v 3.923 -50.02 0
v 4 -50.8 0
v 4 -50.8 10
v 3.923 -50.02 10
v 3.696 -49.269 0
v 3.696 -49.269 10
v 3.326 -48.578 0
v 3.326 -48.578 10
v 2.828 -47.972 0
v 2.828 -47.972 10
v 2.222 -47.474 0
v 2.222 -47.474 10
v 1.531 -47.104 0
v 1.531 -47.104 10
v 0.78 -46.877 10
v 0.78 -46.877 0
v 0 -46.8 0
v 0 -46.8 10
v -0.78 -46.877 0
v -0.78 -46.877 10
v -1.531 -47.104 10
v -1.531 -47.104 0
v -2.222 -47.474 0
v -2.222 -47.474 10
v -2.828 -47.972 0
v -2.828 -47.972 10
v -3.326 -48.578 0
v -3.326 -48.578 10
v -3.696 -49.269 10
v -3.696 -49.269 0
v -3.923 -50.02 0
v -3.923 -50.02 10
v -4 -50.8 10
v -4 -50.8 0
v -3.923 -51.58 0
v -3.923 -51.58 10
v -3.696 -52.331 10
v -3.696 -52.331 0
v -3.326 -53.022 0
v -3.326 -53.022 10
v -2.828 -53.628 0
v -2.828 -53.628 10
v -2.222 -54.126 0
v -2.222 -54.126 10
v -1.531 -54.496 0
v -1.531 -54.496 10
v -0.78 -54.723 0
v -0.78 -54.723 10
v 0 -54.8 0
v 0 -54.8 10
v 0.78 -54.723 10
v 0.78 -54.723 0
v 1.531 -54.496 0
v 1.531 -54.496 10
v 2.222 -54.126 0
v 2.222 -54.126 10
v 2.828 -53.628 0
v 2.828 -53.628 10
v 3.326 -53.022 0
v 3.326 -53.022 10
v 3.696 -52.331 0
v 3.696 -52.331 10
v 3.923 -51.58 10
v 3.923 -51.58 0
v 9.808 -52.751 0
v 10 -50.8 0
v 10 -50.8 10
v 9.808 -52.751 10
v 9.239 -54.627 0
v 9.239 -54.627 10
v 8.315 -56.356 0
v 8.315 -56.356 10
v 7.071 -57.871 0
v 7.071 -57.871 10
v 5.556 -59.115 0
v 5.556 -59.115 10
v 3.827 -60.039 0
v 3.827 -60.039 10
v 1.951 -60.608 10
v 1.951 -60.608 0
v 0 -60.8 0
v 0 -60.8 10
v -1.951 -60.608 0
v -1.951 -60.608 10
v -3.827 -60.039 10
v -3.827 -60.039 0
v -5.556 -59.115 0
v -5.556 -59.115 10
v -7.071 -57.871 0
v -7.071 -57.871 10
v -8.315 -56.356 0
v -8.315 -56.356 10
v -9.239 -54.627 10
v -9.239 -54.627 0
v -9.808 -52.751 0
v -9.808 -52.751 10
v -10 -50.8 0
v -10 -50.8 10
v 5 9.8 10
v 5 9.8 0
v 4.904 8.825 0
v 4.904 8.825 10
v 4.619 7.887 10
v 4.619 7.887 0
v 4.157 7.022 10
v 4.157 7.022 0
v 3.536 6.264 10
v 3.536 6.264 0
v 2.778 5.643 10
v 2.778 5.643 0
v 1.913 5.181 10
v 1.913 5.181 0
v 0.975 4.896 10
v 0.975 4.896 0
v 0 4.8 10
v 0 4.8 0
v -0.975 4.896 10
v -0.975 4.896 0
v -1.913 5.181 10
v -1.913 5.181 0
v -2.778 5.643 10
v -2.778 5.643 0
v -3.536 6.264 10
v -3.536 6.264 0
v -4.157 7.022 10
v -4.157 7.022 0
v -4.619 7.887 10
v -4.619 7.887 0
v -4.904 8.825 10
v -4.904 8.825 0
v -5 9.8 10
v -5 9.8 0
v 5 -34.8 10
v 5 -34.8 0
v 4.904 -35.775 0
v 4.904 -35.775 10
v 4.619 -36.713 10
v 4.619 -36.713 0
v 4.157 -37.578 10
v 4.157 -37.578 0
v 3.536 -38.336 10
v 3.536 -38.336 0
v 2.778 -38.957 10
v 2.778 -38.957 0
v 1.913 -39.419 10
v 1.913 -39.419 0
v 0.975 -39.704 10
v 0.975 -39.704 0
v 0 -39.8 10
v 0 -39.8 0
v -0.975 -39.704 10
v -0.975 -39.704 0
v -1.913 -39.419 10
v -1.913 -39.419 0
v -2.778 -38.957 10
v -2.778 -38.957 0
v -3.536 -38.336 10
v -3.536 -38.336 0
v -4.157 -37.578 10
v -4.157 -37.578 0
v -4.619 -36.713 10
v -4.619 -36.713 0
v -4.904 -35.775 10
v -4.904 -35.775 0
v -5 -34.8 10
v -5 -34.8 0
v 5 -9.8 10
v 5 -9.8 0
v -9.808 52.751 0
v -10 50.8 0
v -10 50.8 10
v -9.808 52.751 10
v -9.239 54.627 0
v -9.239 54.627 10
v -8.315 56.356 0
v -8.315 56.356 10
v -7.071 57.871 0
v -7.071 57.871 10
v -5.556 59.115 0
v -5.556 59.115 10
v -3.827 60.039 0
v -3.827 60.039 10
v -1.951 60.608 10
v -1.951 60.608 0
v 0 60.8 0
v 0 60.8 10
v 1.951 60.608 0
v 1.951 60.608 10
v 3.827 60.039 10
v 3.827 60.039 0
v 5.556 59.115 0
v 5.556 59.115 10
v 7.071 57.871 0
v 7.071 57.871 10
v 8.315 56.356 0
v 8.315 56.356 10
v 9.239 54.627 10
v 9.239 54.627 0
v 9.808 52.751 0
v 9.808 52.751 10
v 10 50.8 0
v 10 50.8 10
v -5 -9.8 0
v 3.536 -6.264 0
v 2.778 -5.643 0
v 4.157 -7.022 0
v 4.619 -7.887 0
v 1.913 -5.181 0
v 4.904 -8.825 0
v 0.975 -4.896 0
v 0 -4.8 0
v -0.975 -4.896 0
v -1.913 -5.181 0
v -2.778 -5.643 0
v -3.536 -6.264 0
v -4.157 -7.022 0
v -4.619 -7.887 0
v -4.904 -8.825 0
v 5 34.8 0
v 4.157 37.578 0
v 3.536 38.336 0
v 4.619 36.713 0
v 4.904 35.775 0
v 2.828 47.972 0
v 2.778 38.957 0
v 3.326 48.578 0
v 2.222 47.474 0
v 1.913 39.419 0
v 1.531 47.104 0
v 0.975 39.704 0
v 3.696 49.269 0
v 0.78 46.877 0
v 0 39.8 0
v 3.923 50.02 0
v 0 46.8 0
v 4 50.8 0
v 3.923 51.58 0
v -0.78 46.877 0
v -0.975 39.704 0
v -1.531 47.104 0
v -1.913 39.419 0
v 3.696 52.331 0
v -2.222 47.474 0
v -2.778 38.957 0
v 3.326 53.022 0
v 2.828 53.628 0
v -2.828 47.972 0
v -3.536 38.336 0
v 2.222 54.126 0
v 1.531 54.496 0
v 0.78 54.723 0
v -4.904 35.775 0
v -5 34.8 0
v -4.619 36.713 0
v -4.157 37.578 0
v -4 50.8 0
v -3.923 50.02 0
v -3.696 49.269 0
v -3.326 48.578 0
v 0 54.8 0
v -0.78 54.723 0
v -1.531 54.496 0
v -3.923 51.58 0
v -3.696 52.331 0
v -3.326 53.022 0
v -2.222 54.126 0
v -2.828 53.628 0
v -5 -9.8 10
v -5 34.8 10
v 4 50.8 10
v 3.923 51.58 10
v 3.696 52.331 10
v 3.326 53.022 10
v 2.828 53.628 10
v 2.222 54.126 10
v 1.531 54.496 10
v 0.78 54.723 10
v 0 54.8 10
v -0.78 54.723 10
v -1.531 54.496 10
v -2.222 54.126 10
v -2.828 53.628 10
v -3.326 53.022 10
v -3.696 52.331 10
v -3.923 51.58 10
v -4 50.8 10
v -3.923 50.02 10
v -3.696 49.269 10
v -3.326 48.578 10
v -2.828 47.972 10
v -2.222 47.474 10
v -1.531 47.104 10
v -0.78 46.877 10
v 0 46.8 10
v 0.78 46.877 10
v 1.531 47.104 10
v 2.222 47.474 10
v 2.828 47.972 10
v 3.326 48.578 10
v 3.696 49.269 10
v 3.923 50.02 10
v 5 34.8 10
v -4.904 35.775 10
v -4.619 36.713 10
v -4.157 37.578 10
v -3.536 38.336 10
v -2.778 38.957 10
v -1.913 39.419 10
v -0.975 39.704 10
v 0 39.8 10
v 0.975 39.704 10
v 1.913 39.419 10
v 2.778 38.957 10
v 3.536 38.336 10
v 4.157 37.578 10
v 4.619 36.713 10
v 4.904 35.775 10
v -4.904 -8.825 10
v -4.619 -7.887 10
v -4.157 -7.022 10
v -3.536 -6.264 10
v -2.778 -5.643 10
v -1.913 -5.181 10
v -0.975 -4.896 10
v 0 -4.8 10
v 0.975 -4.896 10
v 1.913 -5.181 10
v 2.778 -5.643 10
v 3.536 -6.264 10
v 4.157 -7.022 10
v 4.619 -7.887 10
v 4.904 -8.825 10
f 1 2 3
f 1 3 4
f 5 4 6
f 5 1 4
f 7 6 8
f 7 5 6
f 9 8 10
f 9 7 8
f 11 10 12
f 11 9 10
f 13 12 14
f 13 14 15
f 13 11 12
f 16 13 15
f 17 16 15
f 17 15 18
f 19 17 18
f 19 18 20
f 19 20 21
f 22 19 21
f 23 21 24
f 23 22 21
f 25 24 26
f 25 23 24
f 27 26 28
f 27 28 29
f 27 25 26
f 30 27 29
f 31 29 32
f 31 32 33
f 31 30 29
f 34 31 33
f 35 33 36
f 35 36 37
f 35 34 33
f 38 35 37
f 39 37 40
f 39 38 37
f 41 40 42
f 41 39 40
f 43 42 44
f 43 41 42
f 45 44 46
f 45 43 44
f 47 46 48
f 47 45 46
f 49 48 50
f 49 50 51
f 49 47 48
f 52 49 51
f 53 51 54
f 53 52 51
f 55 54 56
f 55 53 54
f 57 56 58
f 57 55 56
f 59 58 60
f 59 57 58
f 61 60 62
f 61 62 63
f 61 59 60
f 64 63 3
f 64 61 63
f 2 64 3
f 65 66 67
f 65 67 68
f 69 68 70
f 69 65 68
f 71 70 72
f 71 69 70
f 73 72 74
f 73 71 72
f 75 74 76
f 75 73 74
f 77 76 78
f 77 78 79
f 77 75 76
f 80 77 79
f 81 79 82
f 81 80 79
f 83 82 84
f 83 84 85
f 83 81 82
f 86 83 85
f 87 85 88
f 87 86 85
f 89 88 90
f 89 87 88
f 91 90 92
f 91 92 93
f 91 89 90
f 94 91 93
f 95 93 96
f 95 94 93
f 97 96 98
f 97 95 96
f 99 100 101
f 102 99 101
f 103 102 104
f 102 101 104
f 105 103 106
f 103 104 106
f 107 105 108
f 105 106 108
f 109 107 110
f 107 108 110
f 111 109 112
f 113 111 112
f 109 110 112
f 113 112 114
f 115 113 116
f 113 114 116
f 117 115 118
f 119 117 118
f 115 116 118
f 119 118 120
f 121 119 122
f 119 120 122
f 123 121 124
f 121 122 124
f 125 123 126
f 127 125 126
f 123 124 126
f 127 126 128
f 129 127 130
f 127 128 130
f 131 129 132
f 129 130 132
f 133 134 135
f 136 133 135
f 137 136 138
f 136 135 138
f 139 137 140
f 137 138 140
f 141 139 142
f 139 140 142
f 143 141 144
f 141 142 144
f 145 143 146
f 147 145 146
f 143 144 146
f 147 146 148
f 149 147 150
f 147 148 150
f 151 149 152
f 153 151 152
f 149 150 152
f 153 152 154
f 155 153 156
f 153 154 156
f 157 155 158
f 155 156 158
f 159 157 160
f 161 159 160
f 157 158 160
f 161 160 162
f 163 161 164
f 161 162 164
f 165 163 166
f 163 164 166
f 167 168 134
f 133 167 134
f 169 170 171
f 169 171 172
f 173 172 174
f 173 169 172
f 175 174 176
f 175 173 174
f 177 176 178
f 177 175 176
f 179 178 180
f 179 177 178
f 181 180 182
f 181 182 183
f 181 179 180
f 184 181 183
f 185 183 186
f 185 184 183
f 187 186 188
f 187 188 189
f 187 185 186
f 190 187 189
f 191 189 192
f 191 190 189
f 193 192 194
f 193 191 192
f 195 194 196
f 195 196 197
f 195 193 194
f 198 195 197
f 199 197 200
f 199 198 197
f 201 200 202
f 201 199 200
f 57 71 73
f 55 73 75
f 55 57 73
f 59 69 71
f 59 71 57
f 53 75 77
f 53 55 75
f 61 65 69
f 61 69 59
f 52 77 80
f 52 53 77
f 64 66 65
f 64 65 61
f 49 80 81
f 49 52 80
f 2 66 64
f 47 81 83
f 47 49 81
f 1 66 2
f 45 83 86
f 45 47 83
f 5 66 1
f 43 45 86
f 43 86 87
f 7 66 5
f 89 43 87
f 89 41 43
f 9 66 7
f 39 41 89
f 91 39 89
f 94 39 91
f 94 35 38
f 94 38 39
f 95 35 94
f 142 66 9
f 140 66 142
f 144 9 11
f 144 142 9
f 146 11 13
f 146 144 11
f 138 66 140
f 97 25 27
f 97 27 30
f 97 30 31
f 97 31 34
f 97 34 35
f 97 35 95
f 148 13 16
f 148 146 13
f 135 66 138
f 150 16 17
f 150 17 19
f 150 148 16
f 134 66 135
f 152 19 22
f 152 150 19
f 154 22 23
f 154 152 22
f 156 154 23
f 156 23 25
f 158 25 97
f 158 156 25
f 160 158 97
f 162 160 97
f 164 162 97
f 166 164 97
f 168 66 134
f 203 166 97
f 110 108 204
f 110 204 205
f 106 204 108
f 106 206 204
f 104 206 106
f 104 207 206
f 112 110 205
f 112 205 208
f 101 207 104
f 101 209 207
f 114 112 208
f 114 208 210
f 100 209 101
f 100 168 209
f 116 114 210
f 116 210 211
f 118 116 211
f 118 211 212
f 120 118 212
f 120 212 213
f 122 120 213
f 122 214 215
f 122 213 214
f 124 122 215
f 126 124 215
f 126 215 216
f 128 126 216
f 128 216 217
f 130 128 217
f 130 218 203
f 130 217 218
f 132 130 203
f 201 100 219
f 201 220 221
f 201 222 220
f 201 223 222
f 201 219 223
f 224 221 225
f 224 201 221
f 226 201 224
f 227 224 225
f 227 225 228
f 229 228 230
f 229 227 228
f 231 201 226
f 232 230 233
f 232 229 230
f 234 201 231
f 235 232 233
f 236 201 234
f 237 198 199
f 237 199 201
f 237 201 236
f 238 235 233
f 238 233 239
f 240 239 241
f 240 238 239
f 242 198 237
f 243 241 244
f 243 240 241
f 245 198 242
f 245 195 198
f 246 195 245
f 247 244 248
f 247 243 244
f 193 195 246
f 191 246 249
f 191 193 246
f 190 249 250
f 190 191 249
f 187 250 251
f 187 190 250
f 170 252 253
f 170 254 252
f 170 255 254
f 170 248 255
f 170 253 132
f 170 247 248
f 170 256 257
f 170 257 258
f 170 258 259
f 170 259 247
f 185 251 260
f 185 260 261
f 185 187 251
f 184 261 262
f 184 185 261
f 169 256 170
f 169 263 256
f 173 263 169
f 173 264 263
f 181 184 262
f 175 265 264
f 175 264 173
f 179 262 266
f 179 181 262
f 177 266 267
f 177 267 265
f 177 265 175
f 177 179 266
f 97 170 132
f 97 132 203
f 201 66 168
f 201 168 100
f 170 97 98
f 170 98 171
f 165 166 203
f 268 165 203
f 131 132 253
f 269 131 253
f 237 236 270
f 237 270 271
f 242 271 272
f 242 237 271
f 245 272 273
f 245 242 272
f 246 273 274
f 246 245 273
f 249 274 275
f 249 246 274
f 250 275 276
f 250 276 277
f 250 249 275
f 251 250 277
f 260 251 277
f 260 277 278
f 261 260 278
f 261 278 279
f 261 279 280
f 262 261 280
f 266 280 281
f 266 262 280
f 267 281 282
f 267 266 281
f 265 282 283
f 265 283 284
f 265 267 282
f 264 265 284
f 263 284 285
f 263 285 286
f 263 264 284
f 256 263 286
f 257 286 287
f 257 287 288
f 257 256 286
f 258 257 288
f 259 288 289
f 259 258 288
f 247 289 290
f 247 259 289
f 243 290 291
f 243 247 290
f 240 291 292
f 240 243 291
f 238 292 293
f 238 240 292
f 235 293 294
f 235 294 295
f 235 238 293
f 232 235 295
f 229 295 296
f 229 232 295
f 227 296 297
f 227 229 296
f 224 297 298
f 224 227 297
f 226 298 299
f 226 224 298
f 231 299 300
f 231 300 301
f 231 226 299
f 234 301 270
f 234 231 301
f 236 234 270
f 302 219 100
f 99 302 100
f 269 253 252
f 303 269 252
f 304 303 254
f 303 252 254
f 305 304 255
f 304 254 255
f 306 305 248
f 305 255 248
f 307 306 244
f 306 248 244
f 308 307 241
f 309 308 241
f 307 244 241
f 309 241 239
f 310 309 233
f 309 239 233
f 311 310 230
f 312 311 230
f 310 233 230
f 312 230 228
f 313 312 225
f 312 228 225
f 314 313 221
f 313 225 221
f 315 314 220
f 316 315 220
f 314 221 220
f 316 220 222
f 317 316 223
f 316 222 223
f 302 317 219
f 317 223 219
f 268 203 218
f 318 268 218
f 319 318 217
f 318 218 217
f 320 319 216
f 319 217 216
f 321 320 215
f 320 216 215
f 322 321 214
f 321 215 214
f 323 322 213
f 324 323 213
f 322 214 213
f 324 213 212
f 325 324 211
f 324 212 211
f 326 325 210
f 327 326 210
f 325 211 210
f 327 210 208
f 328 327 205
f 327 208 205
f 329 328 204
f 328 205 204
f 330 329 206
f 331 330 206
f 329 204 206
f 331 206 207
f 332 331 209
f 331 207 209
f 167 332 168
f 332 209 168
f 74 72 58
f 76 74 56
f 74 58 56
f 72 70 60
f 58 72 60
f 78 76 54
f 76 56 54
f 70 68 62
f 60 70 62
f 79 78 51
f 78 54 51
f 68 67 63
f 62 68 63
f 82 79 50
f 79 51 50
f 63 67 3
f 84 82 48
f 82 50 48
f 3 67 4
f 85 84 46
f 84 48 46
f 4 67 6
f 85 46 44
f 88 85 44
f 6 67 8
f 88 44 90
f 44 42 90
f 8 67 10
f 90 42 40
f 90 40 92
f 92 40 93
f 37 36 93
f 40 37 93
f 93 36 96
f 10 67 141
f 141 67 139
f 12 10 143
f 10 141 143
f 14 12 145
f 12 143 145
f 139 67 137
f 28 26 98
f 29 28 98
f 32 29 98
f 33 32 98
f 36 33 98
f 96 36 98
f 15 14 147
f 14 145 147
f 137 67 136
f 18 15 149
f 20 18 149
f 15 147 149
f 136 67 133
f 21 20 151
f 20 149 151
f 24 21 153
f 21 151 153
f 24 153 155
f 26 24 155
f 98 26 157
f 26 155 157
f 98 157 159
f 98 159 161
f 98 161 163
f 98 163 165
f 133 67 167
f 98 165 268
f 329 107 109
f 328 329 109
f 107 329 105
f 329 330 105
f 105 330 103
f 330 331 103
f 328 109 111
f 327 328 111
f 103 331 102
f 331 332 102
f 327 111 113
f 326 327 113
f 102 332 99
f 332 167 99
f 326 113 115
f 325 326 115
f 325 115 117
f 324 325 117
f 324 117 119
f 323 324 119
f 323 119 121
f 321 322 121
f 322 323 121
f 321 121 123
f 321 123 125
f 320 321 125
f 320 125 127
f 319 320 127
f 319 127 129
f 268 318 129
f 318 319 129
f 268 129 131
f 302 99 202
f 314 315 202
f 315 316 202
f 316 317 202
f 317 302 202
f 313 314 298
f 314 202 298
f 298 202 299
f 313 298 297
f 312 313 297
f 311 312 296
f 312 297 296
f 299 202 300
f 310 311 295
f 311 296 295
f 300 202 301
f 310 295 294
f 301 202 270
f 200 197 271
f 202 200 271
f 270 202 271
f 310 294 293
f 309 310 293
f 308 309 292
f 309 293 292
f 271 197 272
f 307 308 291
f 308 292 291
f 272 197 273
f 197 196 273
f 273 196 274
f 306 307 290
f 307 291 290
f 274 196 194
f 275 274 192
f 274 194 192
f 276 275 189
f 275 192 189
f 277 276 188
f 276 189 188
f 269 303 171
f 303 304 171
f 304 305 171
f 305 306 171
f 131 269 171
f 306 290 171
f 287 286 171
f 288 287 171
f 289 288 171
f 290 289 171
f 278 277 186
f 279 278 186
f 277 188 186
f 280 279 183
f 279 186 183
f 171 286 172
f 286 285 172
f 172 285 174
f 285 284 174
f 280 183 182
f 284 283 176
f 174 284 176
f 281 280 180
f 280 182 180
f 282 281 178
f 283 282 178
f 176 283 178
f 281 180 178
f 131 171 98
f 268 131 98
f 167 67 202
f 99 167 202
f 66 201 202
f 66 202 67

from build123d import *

# Parameters (mm, degrees)
SKETCH1_R           = 4
BOSS_EXTRUDE1_DEPTH = 10


with BuildPart() as part:
    # Sketch1 → Boss-Extrude1 (new body)
    with BuildSketch(Plane.XY):
        with BuildLine():
            Line((-10, -50.8), (-10, 50.8))
            ThreePointArc((-10, 50.8), (0, 60.8), (10, 50.8))
            Line((10, 50.8), (10, -50.8))
            ThreePointArc((10, -50.8), (0, -60.8), (-10, -50.8))
        make_face()
        with Locations((0, -50.8)):
            Circle(SKETCH1_R, mode=Mode.SUBTRACT)
        with Locations((0, 50.8)):
            Circle(SKETCH1_R, mode=Mode.SUBTRACT)
        with BuildLine():
            Line((-5, -34.8), (-5, -9.8))
            ThreePointArc((-5, -9.8), (0, -4.8), (5, -9.8))
            Line((5, -9.8), (5, -34.8))
            ThreePointArc((5, -34.8), (0, -39.8), (-5, -34.8))
        make_face(mode=Mode.SUBTRACT)
        with BuildLine():
            Line((5, 34.8), (5, 9.8))
            ThreePointArc((5, 9.8), (0, 4.8), (-5, 9.8))
            Line((-5, 9.8), (-5, 34.8))
            ThreePointArc((-5, 34.8), (0, 39.8), (5, 34.8))
        make_face(mode=Mode.SUBTRACT)
    extrude(amount=BOSS_EXTRUDE1_DEPTH)


solid = part.part
